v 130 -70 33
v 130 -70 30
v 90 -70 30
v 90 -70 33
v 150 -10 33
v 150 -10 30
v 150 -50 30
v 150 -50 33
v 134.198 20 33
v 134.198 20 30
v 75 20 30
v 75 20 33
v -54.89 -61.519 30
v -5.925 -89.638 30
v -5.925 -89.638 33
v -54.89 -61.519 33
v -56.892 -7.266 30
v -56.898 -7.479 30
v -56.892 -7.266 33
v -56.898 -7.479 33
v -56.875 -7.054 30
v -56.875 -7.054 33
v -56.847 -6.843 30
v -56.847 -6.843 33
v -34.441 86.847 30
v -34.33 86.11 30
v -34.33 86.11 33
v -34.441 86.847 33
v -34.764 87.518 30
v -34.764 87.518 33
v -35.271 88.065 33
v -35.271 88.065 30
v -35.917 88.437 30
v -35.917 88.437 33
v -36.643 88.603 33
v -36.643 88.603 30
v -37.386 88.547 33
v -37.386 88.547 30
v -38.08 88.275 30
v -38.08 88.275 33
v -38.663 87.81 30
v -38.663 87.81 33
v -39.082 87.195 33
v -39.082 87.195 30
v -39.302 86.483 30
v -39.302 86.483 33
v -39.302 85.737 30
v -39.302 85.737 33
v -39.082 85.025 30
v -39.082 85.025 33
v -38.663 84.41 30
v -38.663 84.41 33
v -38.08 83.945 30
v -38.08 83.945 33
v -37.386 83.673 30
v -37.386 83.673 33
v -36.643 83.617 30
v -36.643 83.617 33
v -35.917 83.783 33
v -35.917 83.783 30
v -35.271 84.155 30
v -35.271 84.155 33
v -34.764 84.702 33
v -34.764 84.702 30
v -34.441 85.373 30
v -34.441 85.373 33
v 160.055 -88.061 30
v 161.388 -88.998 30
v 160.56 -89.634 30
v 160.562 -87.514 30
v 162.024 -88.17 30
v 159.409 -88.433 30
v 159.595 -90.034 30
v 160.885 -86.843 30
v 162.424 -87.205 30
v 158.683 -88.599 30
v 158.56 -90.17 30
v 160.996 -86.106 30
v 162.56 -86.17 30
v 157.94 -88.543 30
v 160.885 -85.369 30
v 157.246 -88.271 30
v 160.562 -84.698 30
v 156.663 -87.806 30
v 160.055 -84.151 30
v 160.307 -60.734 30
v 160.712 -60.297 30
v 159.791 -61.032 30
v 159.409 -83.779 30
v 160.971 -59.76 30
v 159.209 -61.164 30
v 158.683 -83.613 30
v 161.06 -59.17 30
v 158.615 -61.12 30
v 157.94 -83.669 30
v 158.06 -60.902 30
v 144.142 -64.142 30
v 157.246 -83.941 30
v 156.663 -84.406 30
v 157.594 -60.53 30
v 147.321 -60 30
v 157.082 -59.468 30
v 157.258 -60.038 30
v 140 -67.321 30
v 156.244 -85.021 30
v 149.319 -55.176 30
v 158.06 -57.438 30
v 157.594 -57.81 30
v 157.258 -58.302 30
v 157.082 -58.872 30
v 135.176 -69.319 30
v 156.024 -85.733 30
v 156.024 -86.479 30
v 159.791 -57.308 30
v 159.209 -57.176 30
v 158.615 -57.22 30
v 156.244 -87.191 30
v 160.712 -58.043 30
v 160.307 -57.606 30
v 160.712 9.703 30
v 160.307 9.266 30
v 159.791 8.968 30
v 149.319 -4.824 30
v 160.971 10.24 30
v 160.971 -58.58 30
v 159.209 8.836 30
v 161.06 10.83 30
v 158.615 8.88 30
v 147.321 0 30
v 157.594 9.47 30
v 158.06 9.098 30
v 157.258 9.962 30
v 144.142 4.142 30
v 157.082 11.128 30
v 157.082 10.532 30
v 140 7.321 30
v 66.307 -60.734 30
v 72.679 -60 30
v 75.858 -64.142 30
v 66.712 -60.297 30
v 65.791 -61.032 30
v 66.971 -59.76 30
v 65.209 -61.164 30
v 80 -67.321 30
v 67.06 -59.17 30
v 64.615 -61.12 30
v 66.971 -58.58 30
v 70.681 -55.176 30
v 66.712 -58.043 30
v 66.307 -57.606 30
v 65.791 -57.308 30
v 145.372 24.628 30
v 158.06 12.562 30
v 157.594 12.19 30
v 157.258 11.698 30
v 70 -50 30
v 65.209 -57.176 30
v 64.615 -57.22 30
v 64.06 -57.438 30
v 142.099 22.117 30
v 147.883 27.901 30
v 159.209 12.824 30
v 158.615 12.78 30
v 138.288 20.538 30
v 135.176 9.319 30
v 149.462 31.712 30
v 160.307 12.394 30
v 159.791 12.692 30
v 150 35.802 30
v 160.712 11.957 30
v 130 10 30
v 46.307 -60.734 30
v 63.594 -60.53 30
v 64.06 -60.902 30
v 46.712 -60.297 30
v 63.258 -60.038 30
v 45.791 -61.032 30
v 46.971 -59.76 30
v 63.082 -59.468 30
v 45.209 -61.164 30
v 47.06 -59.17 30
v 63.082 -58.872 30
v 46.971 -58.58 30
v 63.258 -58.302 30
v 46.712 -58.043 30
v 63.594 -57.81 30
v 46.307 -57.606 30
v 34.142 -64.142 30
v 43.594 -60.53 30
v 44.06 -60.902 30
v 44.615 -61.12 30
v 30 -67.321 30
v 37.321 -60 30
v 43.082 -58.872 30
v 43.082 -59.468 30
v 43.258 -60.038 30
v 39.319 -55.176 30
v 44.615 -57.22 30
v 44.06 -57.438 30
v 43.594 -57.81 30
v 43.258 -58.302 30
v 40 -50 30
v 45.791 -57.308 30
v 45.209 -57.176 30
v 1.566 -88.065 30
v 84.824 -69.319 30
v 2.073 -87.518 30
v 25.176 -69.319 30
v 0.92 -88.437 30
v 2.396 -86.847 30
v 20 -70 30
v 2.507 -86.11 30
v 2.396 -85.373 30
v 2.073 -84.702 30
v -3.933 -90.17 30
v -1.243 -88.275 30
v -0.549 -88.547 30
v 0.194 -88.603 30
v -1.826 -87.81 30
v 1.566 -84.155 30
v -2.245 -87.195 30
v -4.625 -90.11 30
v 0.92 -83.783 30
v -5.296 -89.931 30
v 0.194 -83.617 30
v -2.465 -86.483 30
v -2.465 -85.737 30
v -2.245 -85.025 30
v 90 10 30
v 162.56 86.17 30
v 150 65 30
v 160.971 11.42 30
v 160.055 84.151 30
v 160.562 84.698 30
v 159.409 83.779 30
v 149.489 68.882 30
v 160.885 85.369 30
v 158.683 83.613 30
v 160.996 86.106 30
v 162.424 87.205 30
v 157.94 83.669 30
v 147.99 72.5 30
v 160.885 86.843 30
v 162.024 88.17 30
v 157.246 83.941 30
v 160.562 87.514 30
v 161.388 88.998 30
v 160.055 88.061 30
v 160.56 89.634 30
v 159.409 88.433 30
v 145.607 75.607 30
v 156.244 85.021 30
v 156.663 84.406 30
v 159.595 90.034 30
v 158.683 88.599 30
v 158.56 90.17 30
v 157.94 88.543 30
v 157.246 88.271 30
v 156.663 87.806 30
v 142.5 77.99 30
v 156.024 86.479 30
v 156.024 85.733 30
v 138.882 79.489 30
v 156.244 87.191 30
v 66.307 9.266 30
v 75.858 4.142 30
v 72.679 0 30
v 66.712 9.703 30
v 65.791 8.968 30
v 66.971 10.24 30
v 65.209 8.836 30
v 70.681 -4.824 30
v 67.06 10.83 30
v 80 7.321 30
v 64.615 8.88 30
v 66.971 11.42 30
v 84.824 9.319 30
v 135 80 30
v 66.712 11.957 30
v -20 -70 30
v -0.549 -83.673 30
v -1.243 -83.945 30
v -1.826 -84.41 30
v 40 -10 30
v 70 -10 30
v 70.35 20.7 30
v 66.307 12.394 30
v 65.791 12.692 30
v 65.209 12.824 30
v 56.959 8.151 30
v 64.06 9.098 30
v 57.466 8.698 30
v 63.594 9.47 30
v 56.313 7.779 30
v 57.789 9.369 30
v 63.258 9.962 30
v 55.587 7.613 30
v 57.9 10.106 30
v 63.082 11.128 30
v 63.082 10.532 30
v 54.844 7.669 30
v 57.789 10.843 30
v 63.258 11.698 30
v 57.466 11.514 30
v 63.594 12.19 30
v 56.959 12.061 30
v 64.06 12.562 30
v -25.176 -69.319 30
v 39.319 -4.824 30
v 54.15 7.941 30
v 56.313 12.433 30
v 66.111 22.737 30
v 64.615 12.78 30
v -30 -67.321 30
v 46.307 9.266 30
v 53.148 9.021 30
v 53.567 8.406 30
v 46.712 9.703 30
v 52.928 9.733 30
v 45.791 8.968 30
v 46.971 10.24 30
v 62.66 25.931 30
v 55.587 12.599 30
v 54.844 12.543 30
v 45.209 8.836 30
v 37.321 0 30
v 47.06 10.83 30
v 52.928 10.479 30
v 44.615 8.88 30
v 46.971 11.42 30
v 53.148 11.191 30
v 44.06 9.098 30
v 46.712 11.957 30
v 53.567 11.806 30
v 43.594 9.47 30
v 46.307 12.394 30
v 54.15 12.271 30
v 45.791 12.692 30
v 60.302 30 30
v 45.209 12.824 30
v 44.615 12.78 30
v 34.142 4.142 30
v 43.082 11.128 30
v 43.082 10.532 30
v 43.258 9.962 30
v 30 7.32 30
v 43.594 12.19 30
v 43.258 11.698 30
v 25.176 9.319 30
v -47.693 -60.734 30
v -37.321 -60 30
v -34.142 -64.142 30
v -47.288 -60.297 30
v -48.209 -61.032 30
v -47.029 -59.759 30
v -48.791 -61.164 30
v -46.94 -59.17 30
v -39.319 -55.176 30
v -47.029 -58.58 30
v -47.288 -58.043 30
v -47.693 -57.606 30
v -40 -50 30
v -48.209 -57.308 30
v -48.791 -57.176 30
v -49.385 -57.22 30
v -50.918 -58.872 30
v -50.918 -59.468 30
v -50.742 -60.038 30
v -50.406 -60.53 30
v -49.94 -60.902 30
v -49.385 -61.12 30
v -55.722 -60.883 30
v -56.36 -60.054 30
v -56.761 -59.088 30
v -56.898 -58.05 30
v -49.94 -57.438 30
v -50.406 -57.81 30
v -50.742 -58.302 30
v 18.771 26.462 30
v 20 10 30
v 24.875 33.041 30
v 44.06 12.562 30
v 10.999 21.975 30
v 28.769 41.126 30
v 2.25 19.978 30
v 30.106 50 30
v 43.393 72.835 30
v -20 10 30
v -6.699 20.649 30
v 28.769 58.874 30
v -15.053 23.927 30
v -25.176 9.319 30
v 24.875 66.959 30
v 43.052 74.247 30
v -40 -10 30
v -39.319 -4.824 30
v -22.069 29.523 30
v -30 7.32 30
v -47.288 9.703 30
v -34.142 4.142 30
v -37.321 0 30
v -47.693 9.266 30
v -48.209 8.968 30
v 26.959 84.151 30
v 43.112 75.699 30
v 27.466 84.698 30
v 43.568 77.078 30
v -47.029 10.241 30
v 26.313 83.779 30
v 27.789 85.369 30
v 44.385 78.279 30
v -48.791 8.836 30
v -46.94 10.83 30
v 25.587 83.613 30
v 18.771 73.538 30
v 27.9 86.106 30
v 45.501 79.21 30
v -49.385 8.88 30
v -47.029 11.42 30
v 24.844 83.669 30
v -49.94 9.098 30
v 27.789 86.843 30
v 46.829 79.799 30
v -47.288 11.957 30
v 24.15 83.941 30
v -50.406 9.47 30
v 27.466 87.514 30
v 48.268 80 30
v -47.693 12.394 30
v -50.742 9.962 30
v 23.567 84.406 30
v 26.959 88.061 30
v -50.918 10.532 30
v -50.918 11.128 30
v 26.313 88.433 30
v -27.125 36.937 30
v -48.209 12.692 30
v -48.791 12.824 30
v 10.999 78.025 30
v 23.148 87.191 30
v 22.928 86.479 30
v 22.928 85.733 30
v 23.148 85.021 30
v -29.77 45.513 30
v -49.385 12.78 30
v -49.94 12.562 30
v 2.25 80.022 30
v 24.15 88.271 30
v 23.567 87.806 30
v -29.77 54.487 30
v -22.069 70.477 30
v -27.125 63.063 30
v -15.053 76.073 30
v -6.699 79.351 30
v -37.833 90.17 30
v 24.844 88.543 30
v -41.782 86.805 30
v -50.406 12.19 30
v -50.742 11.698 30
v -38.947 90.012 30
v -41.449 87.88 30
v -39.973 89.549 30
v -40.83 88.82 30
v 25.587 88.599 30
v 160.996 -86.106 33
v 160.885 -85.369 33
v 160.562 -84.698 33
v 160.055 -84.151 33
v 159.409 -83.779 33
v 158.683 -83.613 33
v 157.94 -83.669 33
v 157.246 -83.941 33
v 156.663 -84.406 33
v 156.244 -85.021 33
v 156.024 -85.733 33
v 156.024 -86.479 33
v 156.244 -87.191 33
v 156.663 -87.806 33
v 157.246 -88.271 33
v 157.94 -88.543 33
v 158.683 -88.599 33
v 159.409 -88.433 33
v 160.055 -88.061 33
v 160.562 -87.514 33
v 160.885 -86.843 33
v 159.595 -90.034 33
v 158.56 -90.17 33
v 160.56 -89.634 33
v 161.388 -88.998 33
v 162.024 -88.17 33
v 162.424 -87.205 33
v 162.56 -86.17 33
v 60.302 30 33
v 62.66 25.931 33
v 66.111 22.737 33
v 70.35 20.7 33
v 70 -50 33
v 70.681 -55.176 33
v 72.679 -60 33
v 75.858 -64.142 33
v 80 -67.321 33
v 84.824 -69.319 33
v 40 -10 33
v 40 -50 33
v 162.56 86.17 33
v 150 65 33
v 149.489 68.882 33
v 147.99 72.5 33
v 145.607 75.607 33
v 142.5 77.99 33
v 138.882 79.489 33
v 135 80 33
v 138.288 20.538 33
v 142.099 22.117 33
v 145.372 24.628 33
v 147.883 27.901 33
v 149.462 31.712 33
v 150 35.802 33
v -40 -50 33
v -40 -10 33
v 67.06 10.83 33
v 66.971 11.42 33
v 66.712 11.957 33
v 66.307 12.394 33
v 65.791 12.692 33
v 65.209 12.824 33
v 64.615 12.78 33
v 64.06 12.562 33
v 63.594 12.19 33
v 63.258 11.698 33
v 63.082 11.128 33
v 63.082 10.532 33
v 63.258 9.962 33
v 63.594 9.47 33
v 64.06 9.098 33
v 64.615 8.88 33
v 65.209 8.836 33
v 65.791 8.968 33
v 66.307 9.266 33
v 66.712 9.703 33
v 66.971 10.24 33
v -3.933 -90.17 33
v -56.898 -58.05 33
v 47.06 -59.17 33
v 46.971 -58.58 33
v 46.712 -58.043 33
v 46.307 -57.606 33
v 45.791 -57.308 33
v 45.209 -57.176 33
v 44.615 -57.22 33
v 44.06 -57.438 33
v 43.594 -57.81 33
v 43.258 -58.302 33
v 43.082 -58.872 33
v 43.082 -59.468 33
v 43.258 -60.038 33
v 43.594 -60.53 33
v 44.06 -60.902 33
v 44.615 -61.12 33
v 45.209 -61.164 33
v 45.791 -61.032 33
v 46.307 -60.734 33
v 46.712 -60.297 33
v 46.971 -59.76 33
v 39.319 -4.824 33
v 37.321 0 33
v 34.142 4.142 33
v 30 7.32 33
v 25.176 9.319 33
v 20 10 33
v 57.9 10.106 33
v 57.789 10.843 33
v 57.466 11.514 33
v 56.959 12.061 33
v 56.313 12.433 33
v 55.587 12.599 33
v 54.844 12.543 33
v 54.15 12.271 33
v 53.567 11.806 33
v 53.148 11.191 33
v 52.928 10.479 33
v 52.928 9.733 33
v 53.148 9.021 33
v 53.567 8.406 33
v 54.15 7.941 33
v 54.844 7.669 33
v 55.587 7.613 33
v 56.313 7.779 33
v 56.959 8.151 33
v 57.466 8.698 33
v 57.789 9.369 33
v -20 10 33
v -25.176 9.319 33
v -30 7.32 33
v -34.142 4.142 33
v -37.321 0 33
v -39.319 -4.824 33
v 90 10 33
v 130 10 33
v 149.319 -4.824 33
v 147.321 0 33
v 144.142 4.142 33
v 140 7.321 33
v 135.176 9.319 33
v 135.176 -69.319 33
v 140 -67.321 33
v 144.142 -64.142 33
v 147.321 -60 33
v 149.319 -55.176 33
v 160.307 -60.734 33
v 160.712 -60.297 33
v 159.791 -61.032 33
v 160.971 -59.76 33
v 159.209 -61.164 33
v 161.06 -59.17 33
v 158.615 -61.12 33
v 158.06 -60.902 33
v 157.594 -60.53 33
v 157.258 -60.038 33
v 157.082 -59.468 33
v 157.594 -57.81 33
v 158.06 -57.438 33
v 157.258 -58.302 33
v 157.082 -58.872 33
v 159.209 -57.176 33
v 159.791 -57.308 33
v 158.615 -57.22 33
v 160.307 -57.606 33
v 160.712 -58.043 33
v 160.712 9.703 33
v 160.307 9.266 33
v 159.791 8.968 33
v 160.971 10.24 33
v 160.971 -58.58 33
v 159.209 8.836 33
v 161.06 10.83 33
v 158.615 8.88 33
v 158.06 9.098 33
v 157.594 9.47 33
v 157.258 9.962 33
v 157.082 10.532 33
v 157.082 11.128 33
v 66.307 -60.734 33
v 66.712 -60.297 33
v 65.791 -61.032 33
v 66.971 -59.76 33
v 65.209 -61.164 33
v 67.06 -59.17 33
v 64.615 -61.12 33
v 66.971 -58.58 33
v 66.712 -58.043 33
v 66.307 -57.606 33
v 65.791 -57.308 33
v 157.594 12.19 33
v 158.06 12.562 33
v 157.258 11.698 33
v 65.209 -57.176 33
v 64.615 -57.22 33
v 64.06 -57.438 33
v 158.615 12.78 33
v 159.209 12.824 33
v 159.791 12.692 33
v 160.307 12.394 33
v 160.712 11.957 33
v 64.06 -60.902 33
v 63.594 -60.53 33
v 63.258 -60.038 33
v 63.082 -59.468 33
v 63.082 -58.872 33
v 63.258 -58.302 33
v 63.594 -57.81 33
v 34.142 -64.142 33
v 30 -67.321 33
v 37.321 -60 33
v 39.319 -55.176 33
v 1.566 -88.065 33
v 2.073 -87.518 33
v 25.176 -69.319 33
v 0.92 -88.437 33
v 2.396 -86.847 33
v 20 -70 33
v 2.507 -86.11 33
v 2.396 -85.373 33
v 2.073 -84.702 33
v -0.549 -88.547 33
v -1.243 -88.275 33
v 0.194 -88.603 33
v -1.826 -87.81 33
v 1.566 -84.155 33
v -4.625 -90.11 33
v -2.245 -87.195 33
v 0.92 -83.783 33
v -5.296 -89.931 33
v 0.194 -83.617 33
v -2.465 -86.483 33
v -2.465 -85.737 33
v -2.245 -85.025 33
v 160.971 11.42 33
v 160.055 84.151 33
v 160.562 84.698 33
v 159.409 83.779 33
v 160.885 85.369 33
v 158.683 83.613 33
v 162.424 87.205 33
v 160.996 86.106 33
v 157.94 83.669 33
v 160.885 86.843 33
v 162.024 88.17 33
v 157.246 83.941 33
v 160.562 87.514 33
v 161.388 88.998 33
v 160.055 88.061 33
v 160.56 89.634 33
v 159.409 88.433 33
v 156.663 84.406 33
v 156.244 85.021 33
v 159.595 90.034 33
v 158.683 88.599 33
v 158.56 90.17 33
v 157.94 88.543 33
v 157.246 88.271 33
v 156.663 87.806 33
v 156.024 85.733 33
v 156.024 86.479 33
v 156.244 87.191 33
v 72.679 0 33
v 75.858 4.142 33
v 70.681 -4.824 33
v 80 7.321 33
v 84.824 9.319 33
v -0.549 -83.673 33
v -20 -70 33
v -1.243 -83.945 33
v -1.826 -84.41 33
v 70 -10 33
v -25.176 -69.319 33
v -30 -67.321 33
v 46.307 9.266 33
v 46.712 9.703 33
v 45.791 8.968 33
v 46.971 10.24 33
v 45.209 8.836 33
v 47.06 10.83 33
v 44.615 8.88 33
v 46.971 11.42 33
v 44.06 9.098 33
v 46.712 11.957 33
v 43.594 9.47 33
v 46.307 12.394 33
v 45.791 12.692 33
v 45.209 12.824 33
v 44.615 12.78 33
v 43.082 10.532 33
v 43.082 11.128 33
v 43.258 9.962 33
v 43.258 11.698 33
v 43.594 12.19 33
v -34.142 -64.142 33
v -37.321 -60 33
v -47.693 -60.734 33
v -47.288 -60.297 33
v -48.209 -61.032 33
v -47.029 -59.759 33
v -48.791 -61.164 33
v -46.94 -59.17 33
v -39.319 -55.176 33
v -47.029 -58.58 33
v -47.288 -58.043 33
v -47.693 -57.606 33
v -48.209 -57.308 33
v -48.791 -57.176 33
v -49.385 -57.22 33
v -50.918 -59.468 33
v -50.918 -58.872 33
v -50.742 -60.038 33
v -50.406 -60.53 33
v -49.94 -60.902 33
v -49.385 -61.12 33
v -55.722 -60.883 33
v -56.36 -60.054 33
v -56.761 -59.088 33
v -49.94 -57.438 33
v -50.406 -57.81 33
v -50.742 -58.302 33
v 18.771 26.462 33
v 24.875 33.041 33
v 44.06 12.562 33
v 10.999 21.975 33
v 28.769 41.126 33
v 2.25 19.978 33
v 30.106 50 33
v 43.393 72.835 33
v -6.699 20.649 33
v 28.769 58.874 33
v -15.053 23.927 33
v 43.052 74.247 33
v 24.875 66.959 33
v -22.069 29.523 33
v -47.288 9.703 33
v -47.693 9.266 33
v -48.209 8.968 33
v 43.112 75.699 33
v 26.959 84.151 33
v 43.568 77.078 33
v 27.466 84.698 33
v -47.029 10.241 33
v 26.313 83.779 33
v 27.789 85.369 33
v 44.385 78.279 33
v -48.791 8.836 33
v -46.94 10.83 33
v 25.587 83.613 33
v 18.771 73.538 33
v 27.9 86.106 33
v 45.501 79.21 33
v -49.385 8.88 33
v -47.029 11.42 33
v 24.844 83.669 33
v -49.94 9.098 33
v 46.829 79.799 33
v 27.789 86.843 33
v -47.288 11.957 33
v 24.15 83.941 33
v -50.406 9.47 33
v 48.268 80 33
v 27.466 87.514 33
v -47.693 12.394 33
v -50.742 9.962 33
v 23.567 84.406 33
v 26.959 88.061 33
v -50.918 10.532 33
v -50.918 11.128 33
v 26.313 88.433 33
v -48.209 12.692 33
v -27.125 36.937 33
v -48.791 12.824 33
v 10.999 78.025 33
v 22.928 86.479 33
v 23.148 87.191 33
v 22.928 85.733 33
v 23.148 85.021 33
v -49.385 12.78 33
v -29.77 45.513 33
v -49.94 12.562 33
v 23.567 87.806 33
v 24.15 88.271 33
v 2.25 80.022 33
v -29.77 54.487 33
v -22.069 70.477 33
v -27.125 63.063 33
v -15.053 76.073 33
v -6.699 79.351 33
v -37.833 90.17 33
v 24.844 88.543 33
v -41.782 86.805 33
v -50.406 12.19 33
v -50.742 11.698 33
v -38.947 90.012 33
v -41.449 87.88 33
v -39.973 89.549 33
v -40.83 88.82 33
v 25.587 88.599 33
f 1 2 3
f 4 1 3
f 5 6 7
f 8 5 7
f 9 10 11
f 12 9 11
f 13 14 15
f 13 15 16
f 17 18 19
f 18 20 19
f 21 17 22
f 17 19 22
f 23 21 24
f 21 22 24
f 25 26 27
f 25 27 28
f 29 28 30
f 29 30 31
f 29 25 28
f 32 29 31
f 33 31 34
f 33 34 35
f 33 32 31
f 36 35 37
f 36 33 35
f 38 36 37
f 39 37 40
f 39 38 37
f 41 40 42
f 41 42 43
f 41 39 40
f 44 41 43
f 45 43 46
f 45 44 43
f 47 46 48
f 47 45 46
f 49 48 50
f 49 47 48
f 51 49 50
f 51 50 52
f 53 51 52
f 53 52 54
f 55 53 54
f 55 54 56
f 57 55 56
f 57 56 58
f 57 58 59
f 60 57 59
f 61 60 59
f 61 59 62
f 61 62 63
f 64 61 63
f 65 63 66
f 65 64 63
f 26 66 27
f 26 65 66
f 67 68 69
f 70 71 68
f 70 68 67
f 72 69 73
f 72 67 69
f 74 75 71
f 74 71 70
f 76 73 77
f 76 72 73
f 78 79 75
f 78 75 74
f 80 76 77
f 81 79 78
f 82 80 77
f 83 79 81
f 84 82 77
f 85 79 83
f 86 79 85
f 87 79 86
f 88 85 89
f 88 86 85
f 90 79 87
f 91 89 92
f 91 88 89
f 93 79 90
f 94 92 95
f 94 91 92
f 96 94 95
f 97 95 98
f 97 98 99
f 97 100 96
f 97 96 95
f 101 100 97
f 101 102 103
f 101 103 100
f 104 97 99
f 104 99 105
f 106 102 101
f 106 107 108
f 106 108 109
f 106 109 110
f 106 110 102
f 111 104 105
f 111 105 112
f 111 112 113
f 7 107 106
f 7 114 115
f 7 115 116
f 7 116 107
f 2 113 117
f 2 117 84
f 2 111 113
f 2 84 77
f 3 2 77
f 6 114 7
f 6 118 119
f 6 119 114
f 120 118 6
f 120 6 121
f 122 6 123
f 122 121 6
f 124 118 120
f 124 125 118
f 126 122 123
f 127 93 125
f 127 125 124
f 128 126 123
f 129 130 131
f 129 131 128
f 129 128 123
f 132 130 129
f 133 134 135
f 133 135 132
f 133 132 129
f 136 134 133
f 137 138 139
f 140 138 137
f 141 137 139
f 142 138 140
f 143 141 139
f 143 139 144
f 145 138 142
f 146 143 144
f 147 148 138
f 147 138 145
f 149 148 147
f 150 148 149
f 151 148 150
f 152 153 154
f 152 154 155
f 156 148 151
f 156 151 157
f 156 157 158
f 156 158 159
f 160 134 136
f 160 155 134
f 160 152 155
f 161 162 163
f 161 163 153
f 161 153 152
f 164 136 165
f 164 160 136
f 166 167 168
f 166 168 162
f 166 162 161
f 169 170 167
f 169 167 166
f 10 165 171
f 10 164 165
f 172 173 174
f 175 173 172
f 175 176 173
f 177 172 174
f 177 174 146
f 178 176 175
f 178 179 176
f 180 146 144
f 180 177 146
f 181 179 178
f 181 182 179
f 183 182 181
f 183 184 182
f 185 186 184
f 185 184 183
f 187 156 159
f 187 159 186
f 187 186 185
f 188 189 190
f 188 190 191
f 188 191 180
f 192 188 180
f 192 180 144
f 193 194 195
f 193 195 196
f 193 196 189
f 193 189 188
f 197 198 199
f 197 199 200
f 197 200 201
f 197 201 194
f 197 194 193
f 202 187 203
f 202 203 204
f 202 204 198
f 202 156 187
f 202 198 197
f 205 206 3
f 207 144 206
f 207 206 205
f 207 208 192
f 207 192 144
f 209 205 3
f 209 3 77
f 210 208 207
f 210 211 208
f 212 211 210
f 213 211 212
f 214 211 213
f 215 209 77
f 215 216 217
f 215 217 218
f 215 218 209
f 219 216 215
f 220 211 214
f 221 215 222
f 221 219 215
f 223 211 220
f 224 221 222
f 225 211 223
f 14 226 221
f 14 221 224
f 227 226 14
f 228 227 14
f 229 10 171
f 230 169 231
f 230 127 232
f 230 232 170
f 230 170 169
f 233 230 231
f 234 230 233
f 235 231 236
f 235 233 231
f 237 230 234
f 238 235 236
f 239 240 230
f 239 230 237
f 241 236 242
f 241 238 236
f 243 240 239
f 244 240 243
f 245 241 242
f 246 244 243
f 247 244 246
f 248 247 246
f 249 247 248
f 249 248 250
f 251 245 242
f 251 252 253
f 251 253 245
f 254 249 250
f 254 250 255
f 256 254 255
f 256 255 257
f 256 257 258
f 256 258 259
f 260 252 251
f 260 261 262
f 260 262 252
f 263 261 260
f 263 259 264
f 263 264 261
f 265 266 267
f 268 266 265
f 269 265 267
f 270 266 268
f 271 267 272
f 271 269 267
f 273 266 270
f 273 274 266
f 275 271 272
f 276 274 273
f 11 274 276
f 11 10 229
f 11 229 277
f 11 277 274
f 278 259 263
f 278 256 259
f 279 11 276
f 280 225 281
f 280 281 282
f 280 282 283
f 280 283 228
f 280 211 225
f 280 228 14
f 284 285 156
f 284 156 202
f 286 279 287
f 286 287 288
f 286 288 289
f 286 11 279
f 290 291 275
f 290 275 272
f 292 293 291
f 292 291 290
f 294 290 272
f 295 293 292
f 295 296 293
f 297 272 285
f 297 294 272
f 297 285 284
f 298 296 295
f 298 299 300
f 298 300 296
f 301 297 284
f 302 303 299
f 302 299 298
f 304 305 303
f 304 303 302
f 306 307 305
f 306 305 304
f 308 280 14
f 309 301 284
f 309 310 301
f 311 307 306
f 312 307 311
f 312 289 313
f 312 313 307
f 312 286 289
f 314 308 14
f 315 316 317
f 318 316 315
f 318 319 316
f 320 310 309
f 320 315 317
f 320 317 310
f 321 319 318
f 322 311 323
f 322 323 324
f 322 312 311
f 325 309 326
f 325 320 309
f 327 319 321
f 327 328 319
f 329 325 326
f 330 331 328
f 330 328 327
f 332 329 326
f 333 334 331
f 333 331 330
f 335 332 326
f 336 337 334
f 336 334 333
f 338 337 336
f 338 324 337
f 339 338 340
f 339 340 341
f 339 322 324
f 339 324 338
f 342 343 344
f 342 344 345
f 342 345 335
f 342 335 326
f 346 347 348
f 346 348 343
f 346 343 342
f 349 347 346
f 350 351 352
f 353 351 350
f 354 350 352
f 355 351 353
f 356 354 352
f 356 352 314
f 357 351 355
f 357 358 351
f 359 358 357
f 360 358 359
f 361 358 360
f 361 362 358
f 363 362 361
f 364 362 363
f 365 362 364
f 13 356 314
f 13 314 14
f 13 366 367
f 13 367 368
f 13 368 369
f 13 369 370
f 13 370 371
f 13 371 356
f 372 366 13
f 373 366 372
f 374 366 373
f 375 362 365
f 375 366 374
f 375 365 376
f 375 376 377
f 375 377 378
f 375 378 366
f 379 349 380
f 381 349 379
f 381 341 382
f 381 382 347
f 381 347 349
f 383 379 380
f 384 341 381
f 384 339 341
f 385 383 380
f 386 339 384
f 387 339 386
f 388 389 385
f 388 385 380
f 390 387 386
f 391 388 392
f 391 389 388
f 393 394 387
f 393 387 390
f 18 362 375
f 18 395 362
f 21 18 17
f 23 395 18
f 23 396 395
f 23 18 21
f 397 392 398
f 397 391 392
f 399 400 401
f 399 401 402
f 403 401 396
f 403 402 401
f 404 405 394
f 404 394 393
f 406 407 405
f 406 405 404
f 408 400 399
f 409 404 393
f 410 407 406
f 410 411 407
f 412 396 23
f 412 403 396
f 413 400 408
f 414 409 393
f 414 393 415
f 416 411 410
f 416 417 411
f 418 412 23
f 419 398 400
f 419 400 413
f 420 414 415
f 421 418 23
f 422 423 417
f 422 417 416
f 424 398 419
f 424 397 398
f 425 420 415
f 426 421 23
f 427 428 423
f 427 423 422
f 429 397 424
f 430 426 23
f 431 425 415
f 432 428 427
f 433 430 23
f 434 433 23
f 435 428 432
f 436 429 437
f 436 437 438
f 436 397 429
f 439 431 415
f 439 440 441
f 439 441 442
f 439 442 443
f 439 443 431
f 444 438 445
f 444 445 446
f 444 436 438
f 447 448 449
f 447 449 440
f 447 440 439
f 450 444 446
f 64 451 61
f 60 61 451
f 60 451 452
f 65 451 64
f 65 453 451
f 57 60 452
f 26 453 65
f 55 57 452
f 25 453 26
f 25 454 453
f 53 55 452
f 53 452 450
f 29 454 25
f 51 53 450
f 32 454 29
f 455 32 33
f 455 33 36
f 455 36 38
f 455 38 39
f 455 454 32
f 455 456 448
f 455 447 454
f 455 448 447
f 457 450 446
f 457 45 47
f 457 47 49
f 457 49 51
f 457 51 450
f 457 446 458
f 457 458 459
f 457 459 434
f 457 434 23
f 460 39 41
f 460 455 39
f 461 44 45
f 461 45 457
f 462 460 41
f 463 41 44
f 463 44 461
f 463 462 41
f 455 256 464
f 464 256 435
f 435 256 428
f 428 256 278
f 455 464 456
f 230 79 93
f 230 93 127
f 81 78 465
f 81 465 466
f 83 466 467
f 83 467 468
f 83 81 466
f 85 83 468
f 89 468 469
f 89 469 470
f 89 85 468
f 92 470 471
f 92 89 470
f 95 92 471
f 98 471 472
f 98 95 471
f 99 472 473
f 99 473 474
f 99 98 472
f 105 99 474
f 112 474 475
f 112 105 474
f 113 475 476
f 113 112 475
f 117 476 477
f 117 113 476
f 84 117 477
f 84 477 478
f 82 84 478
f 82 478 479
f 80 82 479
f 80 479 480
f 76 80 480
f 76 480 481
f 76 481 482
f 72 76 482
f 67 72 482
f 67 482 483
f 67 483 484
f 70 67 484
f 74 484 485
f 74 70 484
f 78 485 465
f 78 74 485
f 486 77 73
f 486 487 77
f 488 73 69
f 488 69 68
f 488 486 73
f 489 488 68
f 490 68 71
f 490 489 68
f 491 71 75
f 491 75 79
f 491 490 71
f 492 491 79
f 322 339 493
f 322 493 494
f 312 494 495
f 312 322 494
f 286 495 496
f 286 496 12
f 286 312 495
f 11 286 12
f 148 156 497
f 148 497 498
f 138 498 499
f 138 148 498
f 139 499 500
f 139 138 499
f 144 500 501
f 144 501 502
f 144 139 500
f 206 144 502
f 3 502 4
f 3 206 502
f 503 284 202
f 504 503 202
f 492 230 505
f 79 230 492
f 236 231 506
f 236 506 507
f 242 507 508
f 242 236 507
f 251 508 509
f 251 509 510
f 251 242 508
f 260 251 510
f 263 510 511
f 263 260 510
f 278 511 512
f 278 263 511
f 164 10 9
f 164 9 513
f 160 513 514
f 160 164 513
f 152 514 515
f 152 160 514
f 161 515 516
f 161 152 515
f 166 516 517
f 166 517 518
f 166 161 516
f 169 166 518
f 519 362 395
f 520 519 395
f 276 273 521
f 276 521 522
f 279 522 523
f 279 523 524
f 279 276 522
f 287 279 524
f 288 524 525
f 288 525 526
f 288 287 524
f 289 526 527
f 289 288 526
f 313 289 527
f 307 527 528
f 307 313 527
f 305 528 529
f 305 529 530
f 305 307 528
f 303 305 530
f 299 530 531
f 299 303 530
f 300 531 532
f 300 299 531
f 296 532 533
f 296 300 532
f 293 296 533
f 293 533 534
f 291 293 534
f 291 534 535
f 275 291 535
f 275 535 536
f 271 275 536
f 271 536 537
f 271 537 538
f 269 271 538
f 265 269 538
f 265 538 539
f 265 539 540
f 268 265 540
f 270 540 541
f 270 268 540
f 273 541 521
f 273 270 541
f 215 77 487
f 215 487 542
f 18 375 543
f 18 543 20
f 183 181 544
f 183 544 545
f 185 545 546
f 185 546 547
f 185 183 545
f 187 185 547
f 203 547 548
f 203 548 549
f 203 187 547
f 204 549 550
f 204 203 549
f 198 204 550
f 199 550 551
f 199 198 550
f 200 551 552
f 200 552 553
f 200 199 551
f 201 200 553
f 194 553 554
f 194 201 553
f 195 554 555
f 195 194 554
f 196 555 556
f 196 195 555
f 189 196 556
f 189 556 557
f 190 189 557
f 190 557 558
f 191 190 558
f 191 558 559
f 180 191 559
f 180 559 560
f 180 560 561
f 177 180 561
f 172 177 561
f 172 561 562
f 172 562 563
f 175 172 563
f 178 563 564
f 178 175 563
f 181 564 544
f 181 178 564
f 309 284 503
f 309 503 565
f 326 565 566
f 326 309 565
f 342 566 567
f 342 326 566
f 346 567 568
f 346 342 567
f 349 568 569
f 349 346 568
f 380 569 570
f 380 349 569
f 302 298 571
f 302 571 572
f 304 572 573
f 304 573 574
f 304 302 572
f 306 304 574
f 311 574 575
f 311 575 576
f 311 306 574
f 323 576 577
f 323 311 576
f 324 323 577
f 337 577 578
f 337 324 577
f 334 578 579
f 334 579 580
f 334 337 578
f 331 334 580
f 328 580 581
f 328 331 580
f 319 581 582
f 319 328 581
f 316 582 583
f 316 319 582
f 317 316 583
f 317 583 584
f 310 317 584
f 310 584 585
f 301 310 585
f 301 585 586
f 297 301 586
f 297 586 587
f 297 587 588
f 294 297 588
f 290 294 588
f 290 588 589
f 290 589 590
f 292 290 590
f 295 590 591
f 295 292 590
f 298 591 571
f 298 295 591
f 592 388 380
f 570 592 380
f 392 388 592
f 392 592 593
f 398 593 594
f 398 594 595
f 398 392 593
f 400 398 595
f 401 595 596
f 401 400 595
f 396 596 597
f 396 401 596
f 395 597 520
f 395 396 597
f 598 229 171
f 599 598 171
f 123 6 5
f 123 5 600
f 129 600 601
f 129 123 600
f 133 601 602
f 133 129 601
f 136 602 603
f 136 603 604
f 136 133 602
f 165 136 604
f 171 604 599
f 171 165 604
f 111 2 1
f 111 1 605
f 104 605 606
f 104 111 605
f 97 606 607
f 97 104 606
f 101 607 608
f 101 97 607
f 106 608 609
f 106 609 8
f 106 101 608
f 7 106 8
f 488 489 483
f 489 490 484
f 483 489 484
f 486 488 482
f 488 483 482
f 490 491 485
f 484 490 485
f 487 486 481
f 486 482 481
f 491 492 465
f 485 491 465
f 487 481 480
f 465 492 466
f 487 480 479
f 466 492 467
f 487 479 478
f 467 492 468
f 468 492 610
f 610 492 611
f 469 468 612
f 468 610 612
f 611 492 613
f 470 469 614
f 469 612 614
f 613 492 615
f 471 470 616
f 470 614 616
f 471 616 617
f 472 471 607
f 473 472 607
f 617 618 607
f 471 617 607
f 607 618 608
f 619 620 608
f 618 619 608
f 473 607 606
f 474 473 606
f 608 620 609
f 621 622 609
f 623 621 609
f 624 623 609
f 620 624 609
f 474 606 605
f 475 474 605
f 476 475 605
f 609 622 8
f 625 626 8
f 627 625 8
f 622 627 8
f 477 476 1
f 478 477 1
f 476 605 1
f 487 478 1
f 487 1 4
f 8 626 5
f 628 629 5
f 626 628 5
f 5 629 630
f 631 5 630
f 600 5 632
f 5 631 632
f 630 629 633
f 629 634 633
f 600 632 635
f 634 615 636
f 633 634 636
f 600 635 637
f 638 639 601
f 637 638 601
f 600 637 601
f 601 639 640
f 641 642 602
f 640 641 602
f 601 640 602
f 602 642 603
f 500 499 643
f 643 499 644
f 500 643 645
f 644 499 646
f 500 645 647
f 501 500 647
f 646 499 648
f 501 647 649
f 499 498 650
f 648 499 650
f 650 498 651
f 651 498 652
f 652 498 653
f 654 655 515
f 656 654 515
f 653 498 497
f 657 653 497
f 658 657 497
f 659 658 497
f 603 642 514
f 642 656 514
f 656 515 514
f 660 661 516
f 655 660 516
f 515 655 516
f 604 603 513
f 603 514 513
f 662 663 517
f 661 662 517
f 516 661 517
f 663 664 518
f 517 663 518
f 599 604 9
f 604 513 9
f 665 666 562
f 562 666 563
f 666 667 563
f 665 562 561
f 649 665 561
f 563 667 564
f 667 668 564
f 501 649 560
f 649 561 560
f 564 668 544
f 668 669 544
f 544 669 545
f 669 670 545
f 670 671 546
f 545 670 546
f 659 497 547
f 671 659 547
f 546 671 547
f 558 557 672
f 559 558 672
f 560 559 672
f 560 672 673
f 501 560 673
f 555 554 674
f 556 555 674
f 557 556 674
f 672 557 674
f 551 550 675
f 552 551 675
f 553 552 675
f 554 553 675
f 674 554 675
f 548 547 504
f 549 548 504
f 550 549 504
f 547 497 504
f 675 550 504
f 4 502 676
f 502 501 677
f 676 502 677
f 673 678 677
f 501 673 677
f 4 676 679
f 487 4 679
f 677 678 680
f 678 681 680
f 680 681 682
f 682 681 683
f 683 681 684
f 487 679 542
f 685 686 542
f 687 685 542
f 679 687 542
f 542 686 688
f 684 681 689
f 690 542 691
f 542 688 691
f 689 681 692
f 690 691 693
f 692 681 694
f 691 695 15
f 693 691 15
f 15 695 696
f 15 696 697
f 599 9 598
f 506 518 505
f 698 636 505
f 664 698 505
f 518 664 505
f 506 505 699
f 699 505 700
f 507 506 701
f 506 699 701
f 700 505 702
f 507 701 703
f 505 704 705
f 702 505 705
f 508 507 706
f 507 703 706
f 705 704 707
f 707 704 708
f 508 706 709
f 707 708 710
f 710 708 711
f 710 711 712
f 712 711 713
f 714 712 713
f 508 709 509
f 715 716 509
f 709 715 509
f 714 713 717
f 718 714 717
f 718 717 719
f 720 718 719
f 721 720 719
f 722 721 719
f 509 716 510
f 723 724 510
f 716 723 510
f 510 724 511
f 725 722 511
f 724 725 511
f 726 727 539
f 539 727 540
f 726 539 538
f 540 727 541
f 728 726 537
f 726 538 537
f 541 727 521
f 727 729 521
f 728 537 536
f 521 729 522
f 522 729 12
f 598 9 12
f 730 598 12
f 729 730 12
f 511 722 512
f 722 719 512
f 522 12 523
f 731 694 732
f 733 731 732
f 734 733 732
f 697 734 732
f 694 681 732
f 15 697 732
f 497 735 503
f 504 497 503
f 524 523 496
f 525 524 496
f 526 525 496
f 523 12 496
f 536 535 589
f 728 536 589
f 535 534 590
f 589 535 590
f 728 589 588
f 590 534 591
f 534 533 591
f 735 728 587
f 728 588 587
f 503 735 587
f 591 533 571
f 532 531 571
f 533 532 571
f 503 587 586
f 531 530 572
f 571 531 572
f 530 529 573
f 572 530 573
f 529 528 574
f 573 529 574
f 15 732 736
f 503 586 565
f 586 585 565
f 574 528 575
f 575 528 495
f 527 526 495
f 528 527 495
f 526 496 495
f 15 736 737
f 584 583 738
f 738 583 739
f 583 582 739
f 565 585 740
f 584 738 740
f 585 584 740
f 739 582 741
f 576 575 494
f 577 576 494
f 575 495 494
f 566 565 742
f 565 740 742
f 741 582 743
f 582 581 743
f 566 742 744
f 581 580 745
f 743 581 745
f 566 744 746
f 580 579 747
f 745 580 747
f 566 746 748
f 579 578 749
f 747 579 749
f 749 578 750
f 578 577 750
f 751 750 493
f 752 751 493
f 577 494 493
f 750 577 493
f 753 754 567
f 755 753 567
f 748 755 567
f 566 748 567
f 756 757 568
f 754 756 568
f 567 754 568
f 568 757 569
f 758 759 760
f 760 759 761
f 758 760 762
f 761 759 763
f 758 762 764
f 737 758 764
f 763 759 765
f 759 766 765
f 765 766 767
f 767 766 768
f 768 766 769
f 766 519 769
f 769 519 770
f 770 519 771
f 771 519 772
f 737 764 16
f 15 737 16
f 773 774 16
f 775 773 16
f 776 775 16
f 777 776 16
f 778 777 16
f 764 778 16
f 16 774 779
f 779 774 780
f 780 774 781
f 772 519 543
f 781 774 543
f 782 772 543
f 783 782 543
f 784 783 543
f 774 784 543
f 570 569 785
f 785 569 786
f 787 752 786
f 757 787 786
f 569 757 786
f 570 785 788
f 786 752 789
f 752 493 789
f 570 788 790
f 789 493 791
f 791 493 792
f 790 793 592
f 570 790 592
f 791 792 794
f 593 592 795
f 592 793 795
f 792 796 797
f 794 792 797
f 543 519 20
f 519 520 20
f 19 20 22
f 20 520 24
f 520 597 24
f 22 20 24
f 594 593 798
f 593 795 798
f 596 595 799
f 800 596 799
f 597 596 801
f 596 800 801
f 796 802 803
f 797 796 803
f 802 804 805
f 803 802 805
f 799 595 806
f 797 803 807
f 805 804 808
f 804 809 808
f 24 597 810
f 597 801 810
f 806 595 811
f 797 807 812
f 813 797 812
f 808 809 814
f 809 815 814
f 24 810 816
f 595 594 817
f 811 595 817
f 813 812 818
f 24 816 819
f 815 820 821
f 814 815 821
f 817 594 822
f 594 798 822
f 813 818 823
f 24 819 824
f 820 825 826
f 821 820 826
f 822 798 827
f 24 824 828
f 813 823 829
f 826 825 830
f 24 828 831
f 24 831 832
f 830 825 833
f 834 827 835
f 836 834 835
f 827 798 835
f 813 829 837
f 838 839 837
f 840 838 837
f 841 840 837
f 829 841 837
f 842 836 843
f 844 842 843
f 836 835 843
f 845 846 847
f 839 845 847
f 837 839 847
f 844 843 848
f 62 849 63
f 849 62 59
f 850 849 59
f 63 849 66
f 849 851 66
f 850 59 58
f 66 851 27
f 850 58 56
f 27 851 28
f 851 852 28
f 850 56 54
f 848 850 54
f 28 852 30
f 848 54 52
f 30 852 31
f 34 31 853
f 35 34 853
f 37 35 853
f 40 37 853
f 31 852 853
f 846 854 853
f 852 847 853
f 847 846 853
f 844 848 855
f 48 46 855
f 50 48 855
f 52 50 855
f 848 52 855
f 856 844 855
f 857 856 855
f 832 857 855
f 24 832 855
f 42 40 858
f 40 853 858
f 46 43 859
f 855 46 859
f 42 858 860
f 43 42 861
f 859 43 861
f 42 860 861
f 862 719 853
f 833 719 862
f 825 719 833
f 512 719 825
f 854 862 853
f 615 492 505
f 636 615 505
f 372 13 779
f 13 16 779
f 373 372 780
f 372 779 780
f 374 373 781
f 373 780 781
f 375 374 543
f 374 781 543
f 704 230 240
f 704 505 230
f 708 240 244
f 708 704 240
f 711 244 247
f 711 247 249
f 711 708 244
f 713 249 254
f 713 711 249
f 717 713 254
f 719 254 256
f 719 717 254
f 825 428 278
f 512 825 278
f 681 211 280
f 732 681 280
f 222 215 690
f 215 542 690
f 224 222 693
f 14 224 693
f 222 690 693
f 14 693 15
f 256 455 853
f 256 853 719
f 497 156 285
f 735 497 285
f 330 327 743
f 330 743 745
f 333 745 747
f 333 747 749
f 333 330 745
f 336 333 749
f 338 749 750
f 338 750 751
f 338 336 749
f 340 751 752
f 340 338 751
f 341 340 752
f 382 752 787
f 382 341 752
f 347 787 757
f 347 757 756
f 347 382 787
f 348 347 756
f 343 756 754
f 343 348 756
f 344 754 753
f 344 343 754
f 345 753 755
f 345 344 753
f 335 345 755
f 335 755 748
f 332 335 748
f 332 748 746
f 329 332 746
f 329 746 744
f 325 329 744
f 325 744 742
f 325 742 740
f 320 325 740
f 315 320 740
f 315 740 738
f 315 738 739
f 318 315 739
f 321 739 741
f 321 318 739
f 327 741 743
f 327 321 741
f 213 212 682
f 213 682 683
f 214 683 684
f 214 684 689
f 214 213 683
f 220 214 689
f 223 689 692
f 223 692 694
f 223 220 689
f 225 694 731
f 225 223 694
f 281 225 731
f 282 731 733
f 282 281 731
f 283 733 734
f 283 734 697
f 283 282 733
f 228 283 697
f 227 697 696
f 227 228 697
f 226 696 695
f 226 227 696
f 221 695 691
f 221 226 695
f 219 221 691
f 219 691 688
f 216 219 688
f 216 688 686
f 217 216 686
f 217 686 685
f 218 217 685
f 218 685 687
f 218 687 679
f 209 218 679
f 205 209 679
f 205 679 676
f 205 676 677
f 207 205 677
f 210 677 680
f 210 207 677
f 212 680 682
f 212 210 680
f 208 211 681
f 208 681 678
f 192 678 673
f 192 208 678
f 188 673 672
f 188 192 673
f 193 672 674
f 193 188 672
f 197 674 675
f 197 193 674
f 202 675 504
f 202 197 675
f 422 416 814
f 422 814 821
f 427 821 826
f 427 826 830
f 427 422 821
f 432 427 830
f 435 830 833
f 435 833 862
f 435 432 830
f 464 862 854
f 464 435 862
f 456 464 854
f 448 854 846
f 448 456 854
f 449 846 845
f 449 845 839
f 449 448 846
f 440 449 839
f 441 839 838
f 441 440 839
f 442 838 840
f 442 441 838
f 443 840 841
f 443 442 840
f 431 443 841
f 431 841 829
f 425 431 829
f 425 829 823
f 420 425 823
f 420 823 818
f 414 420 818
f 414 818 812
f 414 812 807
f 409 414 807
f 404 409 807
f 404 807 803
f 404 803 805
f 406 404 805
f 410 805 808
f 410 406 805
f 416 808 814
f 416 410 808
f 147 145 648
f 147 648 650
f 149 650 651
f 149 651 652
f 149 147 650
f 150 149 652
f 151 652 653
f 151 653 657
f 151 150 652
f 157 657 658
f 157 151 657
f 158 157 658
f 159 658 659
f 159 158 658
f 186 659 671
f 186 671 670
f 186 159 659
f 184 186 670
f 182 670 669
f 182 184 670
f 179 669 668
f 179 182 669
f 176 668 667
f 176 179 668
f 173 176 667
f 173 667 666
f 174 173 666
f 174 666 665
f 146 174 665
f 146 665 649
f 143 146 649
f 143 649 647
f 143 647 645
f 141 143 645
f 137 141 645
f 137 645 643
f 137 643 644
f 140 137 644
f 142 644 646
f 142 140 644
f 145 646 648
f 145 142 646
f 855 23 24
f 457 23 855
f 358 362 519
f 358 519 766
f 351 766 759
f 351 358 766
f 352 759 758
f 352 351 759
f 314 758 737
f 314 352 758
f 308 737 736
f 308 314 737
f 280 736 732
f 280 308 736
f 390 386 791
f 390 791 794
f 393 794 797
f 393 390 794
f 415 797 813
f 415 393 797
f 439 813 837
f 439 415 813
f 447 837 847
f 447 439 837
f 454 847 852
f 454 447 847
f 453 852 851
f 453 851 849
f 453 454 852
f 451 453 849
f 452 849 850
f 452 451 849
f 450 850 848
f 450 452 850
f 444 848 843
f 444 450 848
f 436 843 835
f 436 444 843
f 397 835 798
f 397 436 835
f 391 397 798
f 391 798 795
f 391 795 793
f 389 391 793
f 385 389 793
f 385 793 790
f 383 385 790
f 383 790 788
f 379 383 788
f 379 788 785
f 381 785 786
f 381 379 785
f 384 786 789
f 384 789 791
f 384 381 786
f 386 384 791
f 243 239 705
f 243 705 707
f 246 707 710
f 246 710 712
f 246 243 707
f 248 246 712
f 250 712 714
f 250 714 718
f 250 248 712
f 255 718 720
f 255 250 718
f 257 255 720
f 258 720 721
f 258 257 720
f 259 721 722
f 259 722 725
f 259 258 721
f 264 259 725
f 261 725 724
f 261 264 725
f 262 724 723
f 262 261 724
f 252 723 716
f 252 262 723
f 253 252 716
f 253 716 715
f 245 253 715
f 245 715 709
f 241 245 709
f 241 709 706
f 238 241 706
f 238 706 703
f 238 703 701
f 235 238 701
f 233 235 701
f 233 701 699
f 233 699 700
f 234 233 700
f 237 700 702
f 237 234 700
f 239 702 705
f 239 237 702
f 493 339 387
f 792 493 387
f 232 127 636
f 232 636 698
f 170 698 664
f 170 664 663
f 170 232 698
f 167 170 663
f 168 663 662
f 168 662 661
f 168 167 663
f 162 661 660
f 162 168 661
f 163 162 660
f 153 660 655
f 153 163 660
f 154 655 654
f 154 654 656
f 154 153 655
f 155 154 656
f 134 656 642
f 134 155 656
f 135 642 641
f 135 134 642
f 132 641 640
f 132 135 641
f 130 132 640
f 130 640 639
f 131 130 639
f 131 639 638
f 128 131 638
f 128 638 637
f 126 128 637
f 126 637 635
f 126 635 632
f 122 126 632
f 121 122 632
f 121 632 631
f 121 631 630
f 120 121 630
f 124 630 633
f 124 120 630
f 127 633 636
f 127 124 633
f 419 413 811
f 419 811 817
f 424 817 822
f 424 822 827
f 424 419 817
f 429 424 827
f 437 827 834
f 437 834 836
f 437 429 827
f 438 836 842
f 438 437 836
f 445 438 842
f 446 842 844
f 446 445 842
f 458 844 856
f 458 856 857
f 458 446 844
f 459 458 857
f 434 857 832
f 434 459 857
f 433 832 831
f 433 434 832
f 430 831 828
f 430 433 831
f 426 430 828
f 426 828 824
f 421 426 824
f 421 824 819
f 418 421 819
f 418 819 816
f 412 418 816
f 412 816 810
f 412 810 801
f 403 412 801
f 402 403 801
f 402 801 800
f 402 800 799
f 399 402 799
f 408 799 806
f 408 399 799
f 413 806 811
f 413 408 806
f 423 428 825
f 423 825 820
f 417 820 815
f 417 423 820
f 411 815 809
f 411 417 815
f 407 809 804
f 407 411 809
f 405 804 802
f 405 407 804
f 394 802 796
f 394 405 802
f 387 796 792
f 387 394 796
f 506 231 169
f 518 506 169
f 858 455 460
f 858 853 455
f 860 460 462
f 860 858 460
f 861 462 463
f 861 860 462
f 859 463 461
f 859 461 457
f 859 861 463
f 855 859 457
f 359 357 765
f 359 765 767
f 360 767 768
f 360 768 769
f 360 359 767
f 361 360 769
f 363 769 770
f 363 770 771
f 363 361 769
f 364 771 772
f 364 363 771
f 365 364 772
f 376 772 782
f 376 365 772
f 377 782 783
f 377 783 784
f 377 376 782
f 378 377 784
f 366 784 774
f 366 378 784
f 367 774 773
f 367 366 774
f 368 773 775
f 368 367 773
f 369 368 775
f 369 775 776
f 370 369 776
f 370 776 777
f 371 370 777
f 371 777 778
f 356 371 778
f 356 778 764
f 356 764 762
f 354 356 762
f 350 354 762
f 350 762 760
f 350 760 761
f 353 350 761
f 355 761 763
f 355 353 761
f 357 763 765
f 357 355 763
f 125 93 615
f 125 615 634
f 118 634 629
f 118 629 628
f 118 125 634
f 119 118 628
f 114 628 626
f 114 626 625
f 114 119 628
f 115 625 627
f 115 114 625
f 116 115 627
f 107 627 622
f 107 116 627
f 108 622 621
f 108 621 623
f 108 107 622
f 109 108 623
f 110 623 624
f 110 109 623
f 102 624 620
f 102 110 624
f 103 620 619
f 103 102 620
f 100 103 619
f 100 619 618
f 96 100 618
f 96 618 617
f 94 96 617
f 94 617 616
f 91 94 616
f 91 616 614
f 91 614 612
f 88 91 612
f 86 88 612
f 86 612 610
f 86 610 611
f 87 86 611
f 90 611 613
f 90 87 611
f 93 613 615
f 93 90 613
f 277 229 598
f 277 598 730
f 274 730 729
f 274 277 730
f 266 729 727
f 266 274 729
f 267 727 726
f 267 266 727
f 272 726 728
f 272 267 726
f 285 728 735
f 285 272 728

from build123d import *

# Parameters (mm, degrees)
SKETCH_R   = 2.5
SKETCH_R_2 = 2
SKETCH_R_3 = 30.106081
PAD_DEPTH  = 3
FILLET_R   = 4


with BuildPart() as part:
    # Sketch → Pad (new body)
    with BuildSketch(Plane.XY.offset(30)):
        Polygon((162.56, -90.17), (-5.000233, -90.169747), (-56.898089, -60.365632), (-56.898089, -7.158878), (-41.241165, 90.17), (162.56, 90.17), align=None)
        with Locations((25.4, 86.106)):
            Circle(SKETCH_R, mode=Mode.SUBTRACT)
        with Locations((158.496, 86.106)):
            Circle(SKETCH_R, mode=Mode.SUBTRACT)
        with Locations((55.4, 10.106)):
            Circle(SKETCH_R, mode=Mode.SUBTRACT)
        with Locations((0.007, -86.11)):
            Circle(SKETCH_R, mode=Mode.SUBTRACT)
        with Locations((158.496, -86.106)):
            Circle(SKETCH_R, mode=Mode.SUBTRACT)
        with Locations((-36.83, 86.11)):
            Circle(SKETCH_R, mode=Mode.SUBTRACT)
        with Locations((159.06, -59.17)):
            Circle(SKETCH_R_2, mode=Mode.SUBTRACT)
        with Locations((159.059998, 10.83)):
            Circle(SKETCH_R_2, mode=Mode.SUBTRACT)
        with Locations((65.059998, 10.830006)):
            Circle(SKETCH_R_2, mode=Mode.SUBTRACT)
        with Locations((65.06, -59.169994)):
            Circle(SKETCH_R_2, mode=Mode.SUBTRACT)
        with Locations((45.06, -59.169992)):
            Circle(SKETCH_R_2, mode=Mode.SUBTRACT)
        with Locations((45.059997, 10.830008)):
            Circle(SKETCH_R_2, mode=Mode.SUBTRACT)
        with Locations((-48.940003, 10.830015)):
            Circle(SKETCH_R_2, mode=Mode.SUBTRACT)
        with Locations((-48.94, -59.169984)):
            Circle(SKETCH_R_2, mode=Mode.SUBTRACT)
        with Locations((0, 50)):
            Circle(SKETCH_R_3, mode=Mode.SUBTRACT)
        with BuildLine():
            ThreePointArc((90.000007, 10), (75.857866, 4.142134), (70, -10.000007))
            Line((70, -50), (70, -10.000007))
            ThreePointArc((70, -50), (75.857866, -64.14214), (90.000007, -70.000007))
            Line((130, -70.000007), (90.000007, -70.000007))
            ThreePointArc((130, -70.000007), (144.14214, -64.14214), (150.000007, -50))
            Line((150.000007, -10.000007), (150.000007, -50))
            ThreePointArc((150.000007, -10.000007), (144.14214, 4.142134), (130, 10))
            Line((90.000007, 10), (130, 10))
        make_face(mode=Mode.SUBTRACT)
        with BuildLine():
            Line((-40, -50.00001), (-40, -10.000017))
            ThreePointArc((-19.999993, 9.99999), (-34.142134, 4.142124), (-40, -10.000017))
            Line((-19.999993, 9.99999), (20, 9.99999))
            ThreePointArc((40.000007, -10.000017), (34.14214, 4.142124), (20, 9.99999))
            Line((40.000007, -10.000017), (40.000007, -50.00001))
            ThreePointArc((20, -70.000017), (34.14214, -64.14215), (40.000007, -50.00001))
            Line((20, -70.000017), (-19.999993, -70.000017))
            ThreePointArc((-40, -50.00001), (-34.142134, -64.14215), (-19.999993, -70.000017))
        make_face(mode=Mode.SUBTRACT)
        with BuildLine():
            ThreePointArc((134.197919, 20), (145.371681, 24.628324), (150.000005, 35.802086))
            Line((150.000005, 65.000005), (150.000005, 35.802086))
            ThreePointArc((150.000005, 65.000005), (145.606605, 75.606611), (135, 80.00001))
            Line((48.267642, 80.00001), (135, 80.00001))
            ThreePointArc((48.267642, 80.00001), (43.934723, 77.707276), (43.393027, 72.835172))
            Line((60.301612, 30.000089), (43.393027, 72.835172))
            ThreePointArc((60.301612, 30.000089), (66.111185, 22.737064), (75.000005, 20))
            Line((134.197919, 20), (75.000005, 20))
        make_face(mode=Mode.SUBTRACT)
    extrude(amount=PAD_DEPTH)

    # Fillet
    fillet_edges = [part.edges().sort_by_distance(p)[0] for p in [
        (-5.000233, -90.169747, 31.5),
        (162.56, -90.17, 31.5),
        (162.56, 90.17, 31.5),
        (-56.898089, -60.365632, 31.5),
        (-56.898089, -7.158878, 31.5),
        (-41.241165, 90.17, 31.5),
    ]]
    fillet(fillet_edges, radius=FILLET_R)


solid = part.part
